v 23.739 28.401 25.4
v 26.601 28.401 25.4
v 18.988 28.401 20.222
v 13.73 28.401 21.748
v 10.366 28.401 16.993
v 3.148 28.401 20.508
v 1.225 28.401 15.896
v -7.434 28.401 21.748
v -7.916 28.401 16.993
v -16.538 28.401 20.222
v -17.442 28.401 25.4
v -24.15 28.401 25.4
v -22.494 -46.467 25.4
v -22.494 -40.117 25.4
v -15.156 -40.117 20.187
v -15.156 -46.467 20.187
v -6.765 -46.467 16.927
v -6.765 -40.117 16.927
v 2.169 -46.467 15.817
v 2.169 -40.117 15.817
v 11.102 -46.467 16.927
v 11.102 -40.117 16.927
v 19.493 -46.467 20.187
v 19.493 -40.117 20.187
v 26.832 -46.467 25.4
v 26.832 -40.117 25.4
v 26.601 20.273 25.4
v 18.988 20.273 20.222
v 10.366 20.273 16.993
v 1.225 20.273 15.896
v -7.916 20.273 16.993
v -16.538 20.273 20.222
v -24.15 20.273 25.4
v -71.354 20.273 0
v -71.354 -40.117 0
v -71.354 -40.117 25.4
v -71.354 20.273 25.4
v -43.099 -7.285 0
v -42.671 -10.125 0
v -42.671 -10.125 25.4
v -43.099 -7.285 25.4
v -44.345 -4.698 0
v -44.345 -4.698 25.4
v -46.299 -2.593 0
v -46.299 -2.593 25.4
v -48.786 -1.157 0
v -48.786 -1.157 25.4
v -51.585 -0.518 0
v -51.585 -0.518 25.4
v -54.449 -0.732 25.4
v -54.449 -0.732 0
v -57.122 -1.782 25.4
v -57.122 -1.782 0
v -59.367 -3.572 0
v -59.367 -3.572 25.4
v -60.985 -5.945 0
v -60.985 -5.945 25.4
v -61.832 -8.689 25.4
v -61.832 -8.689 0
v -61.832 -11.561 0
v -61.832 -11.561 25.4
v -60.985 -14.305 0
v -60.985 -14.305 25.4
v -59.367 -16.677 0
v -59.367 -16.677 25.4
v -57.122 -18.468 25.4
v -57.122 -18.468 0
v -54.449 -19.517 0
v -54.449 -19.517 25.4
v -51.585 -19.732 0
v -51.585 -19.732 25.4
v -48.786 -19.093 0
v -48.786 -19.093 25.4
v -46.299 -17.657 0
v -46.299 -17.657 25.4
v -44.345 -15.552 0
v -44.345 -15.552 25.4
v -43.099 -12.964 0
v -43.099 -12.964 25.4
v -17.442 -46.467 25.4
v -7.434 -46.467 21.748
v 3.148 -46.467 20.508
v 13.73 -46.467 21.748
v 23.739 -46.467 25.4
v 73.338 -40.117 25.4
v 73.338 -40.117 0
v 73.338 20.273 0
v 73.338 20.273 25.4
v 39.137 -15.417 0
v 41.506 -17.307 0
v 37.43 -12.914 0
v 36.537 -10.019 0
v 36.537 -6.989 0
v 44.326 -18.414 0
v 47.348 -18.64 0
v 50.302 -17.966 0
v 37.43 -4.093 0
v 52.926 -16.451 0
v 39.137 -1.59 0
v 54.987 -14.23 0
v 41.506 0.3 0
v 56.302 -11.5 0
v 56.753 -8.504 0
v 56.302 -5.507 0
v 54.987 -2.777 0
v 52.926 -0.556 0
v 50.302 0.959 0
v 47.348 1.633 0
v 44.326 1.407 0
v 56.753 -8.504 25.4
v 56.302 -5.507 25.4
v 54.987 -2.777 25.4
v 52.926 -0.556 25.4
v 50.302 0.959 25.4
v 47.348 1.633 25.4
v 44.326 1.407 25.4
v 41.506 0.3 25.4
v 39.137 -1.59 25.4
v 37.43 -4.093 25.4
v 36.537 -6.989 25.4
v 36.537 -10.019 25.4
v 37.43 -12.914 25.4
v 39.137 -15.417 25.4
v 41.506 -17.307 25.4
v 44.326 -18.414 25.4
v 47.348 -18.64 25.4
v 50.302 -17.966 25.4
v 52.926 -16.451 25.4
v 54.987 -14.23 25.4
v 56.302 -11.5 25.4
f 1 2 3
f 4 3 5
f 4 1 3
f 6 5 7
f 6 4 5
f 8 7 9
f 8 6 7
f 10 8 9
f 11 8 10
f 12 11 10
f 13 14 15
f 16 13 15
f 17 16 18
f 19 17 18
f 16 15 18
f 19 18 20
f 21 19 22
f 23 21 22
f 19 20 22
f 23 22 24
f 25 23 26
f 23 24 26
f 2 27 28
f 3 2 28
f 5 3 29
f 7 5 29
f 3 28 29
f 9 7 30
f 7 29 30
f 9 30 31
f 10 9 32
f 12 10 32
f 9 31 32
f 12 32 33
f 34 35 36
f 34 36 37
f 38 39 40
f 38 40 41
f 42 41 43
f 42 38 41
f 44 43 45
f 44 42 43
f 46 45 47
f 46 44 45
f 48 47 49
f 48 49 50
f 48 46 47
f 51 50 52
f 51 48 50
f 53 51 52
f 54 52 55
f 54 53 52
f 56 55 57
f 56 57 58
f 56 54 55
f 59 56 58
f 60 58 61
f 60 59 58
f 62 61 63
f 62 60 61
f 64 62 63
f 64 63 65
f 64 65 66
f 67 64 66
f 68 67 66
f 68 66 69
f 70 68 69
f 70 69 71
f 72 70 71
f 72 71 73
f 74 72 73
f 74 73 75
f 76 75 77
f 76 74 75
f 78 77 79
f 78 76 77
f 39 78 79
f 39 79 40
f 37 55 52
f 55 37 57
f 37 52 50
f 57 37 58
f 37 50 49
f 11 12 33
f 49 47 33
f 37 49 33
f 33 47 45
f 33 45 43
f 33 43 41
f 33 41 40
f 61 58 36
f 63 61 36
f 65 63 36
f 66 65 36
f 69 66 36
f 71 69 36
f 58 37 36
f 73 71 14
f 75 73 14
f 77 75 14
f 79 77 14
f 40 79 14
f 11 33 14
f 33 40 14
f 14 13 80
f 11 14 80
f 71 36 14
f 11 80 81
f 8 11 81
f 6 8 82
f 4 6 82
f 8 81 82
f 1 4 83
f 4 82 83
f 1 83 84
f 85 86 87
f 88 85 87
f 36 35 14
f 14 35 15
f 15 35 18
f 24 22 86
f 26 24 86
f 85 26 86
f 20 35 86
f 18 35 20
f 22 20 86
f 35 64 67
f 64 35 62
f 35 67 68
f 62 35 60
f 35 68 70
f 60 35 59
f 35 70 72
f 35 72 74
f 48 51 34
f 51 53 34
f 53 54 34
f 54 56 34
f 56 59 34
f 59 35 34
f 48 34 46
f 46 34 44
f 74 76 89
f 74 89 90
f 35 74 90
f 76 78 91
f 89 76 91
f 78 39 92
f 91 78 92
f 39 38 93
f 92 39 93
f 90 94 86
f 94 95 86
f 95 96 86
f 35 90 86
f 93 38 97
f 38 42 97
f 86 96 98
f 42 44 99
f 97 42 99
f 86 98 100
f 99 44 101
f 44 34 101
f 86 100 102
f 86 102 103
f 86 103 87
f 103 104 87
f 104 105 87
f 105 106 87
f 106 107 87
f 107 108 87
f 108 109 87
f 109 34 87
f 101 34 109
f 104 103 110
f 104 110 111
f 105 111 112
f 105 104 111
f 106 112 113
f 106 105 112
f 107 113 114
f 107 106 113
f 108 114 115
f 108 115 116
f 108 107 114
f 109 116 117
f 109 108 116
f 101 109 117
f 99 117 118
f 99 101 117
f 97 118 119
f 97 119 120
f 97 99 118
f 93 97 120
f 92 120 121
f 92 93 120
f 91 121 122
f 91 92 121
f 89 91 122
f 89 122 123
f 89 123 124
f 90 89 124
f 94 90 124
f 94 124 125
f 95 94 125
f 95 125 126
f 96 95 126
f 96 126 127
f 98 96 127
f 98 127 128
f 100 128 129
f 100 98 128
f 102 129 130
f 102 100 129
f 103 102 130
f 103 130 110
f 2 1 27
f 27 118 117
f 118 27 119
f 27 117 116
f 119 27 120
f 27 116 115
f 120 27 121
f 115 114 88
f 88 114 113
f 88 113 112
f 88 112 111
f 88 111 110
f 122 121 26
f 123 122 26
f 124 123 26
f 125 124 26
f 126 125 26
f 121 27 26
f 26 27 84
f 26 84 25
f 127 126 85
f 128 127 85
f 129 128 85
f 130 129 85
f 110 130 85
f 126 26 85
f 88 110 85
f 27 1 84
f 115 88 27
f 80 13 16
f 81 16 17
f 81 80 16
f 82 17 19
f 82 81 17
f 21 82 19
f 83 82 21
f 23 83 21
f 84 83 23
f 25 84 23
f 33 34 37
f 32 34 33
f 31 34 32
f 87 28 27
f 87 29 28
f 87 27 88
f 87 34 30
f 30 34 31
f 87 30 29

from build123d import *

# Parameters (mm, degrees)
F0_W     = 144.692793
F0_H     = 60.389988
F0_R     = 9.633917
F0_R_2   = 10.164922
F1_DEPTH = 25.4
F3_DEPTH = 61.214
F4_DEPTH = 6.35
F6_DEPTH = 8.128


with BuildPart() as f1:
    # F0 (on Top) → F1 (new body)
    with BuildSketch(Plane.XY):
        with Locations((0.991925, -9.922072)):
            Rectangle(F0_W, F0_H)
        with Locations((-52.305277, -10.124722)):
            Circle(F0_R, mode=Mode.SUBTRACT)
        with Locations((46.588395, -8.503514)):
            Circle(F0_R_2, mode=Mode.SUBTRACT)
    extrude(amount=F1_DEPTH)

    # F2 (on face) → F3 (cut)
    with BuildSketch(Plane.XZ.offset(40.117066)):
        with BuildLine():
            Line((23.738548, 25.4), (-17.442467, 25.4))
            ThreePointArc((-17.442467, 25.4), (3.148041, 20.508191), (23.738548, 25.4))
        make_face()
    extrude(amount=-F3_DEPTH, mode=Mode.SUBTRACT)

    # F2 (on face) → F4 (join)
    with BuildSketch(Plane.XZ.offset(40.117066)):
        with BuildLine():
            ThreePointArc((23.738548, 25.4), (3.148041, 20.508191), (-17.442467, 25.4))
            Line((-17.442467, 25.4), (-22.494383, 25.4))
            ThreePointArc((-22.494383, 25.4), (2.168844, 15.81733), (26.83207, 25.4))
            Line((26.83207, 25.4), (23.738548, 25.4))
        make_face()
    extrude(amount=F4_DEPTH)

    # F5 (on face) → F6 (join)
    with BuildSketch(Plane(origin=(0, 20.272922, 0), x_dir=(-1, 0, 0), z_dir=(0, 1, 0))):
        with BuildLine():
            Line((-23.738548, 25.4), (-26.600901, 25.4))
            ThreePointArc((-26.600901, 25.4), (-1.22531, 15.895824), (24.15028, 25.4))
            Line((24.15028, 25.4), (17.442467, 25.4))
            ThreePointArc((17.442467, 25.4), (-3.148041, 20.508191), (-23.738548, 25.4))
        make_face()
    extrude(amount=F6_DEPTH)


solid = f1.part
